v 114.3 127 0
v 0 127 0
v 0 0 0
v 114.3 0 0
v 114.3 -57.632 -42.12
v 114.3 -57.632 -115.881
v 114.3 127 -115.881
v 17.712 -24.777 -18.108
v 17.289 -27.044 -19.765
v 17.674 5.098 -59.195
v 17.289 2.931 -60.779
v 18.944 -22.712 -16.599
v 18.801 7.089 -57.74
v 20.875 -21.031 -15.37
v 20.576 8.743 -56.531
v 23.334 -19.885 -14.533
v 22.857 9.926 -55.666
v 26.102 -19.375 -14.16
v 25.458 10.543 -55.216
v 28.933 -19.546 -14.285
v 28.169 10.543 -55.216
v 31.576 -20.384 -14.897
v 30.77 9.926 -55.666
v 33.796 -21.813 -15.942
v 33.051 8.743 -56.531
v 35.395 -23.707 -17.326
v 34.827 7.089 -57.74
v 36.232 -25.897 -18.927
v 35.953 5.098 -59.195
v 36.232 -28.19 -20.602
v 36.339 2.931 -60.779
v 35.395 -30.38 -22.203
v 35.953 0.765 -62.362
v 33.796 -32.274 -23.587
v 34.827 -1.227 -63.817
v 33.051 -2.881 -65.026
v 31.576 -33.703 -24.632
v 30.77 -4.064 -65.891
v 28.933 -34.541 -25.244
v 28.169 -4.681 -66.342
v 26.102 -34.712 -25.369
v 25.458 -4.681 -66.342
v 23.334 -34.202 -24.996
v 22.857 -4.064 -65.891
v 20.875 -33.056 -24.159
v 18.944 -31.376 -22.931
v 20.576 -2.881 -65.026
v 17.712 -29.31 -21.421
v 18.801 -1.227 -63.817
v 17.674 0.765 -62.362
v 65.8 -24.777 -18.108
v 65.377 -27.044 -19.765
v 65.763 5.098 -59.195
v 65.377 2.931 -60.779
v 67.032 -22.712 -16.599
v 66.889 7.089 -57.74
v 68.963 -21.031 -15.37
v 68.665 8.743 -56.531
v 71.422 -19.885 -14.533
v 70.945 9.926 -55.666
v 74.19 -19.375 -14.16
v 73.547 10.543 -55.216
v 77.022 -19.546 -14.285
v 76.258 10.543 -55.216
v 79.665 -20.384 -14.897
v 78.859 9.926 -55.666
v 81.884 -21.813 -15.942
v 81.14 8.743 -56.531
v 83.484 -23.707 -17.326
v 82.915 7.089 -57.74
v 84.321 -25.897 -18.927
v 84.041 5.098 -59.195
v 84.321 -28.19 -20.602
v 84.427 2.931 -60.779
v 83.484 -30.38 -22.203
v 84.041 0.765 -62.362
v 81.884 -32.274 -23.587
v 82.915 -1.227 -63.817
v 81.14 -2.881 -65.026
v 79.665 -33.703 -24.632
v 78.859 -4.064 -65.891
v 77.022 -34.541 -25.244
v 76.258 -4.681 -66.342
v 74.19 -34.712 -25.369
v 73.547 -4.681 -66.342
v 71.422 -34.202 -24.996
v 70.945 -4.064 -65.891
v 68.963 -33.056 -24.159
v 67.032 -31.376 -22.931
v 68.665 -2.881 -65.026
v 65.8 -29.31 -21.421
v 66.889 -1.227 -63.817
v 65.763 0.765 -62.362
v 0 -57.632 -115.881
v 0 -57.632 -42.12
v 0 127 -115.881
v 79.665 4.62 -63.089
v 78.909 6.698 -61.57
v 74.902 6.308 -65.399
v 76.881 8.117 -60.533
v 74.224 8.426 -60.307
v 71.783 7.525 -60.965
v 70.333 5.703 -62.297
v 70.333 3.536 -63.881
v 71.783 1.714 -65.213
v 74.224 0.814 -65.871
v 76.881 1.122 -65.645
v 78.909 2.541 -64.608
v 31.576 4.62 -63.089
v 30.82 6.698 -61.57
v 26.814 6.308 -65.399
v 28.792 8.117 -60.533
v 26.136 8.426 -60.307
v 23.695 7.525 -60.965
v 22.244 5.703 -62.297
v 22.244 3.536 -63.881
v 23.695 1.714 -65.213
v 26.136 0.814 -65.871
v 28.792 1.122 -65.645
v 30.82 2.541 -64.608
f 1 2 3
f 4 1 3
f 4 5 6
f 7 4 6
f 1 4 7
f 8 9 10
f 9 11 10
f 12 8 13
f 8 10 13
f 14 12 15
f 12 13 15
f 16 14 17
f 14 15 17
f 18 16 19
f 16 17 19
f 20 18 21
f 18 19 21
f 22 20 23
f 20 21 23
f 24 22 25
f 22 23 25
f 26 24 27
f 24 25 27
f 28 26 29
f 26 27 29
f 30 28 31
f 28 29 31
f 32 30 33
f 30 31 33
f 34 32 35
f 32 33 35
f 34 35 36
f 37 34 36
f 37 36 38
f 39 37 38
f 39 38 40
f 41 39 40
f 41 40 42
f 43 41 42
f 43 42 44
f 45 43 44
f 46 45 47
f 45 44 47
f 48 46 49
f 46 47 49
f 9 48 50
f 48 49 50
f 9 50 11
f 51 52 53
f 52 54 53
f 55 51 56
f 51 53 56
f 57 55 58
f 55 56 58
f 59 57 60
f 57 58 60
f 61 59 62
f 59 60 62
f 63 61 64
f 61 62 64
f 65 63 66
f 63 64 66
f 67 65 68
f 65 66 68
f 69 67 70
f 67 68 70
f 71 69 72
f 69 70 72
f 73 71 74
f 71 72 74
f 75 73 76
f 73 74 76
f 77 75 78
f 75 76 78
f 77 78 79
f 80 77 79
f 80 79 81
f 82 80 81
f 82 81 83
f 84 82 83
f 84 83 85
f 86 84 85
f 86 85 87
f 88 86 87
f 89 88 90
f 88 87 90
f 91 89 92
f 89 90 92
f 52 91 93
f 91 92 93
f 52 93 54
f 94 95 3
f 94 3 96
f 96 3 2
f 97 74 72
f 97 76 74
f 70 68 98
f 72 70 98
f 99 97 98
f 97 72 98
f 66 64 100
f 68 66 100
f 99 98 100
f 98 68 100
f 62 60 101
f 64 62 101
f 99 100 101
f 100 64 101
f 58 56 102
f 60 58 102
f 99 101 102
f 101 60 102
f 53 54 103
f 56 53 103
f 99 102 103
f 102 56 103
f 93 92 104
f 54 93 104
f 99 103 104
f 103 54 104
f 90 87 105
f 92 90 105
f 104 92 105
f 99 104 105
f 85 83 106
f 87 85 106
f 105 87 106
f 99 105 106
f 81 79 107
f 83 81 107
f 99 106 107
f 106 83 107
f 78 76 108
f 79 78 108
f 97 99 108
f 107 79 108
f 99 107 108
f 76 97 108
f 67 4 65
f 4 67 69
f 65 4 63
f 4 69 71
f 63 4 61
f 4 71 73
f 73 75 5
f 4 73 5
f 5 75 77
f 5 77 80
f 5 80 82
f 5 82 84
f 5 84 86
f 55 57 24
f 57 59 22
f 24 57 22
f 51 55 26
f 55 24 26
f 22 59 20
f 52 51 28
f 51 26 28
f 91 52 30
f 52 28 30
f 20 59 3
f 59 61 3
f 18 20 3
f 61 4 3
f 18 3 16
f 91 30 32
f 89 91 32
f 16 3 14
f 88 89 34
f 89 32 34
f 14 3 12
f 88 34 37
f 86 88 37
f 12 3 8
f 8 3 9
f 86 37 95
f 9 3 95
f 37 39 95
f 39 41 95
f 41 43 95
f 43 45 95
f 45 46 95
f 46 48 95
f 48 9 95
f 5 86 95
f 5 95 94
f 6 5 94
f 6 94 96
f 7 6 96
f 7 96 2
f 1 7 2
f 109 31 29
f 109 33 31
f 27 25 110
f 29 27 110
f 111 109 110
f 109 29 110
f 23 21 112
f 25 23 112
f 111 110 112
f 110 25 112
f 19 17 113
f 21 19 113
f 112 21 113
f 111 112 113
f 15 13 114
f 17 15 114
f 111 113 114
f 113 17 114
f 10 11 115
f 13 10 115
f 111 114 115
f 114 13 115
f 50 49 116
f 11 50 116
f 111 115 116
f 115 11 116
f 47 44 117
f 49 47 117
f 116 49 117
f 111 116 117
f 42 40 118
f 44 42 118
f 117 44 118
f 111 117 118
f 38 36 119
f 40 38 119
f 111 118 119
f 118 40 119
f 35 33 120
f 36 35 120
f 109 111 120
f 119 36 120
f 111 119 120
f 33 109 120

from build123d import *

# Parameters (mm, degrees)
F1_DEPTH = 114.3
F3_D     = 19.05
F3_DEPTH = 50.8
F3_TIP   = 5.7231973962


with BuildPart() as f1:
    # F0 (on Right) → F1 (new body)
    with BuildSketch(Plane.YZ):
        Polygon((127, 0), (0, 0), (-57.6322190464, -42.119871825), (-57.6322190464, -115.8806011081), (127, -115.8806011081), align=None)
    extrude(amount=F1_DEPTH)

    # F3
    with Locations(Plane(origin=(0, 0, 0), x_dir=(1, 0, 0), z_dir=(0, -0.5900532948, 0.8073642977))):
        with Locations((74.9021172523, -33.4962010384), (26.8135797232, -33.4962010384)):
            Hole(F3_D / 2, depth=F3_DEPTH)
            with Locations((0, 0, -(F3_DEPTH + F3_TIP / 2))):  # 118° drill point
                Cone(0, F3_D / 2, F3_TIP, mode=Mode.SUBTRACT)


solid = f1.part
